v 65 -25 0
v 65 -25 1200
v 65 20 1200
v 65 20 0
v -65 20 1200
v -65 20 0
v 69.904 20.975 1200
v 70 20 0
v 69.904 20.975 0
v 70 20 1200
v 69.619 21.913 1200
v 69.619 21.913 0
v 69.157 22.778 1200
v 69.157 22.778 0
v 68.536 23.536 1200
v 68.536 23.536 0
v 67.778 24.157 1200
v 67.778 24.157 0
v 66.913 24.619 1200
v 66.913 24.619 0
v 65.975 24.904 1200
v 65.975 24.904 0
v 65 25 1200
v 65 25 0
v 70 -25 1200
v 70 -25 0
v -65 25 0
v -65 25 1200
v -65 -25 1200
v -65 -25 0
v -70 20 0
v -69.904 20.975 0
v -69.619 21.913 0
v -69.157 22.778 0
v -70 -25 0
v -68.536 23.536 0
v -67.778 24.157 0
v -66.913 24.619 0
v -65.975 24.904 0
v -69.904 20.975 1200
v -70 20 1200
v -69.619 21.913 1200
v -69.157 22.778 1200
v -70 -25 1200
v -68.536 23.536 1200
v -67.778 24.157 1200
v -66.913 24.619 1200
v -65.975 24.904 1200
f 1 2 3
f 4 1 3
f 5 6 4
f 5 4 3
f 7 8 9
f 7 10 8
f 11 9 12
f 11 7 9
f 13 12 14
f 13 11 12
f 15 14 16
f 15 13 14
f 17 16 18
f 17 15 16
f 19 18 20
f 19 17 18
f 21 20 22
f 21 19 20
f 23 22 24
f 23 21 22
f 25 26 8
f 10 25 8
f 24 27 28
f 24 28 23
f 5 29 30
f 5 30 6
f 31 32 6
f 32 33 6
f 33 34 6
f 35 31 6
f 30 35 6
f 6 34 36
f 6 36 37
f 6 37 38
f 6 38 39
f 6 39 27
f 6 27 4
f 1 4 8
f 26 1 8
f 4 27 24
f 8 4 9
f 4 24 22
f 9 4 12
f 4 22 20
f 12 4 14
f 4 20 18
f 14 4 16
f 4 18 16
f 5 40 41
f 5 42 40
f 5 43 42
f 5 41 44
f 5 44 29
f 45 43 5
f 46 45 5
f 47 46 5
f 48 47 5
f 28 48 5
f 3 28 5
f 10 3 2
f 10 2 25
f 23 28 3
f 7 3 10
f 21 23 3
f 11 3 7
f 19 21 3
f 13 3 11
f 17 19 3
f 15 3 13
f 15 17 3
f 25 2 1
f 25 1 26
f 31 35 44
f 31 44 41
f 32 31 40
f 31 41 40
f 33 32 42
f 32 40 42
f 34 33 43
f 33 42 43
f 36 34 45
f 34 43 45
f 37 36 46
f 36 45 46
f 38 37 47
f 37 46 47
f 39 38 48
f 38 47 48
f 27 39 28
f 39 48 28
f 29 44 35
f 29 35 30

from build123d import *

# Parameters (mm, degrees)
ESBO_O1_W                = 140
ESBO_O1_H                = 50
RESSALTO_EXTRUS_O1_DEPTH = 1200
FILETE1_R                = 5
CASCA1_START             = -65
CASCA1_OUTLINE_W         = 45
CASCA1_OUTLINE_H         = 1200
CASCA1_DEPTH             = 130


# Read off the part's stored shape, not the designer's step: Casca1
with BuildPart() as part:
    # Esboço1 → Ressalto-extrusão1 (new body)
    with BuildSketch(Plane.XY):
        Rectangle(ESBO_O1_W, ESBO_O1_H)
    extrude(amount=RESSALTO_EXTRUS_O1_DEPTH)

    # Filete1
    filete1_edges = [part.edges().sort_by_distance(p)[0] for p in [
        (-70, 25, 600),
        (70, 25, 600),
    ]]
    fillet(filete1_edges, radius=FILETE1_R)

    # Casca1 outline → Casca1 (cut)
    with BuildSketch(Plane.YZ.offset(CASCA1_START)):
        with Locations((-2.5, 600)):
            Rectangle(CASCA1_OUTLINE_W, CASCA1_OUTLINE_H)
    extrude(amount=CASCA1_DEPTH, mode=Mode.SUBTRACT)


solid = part.part
